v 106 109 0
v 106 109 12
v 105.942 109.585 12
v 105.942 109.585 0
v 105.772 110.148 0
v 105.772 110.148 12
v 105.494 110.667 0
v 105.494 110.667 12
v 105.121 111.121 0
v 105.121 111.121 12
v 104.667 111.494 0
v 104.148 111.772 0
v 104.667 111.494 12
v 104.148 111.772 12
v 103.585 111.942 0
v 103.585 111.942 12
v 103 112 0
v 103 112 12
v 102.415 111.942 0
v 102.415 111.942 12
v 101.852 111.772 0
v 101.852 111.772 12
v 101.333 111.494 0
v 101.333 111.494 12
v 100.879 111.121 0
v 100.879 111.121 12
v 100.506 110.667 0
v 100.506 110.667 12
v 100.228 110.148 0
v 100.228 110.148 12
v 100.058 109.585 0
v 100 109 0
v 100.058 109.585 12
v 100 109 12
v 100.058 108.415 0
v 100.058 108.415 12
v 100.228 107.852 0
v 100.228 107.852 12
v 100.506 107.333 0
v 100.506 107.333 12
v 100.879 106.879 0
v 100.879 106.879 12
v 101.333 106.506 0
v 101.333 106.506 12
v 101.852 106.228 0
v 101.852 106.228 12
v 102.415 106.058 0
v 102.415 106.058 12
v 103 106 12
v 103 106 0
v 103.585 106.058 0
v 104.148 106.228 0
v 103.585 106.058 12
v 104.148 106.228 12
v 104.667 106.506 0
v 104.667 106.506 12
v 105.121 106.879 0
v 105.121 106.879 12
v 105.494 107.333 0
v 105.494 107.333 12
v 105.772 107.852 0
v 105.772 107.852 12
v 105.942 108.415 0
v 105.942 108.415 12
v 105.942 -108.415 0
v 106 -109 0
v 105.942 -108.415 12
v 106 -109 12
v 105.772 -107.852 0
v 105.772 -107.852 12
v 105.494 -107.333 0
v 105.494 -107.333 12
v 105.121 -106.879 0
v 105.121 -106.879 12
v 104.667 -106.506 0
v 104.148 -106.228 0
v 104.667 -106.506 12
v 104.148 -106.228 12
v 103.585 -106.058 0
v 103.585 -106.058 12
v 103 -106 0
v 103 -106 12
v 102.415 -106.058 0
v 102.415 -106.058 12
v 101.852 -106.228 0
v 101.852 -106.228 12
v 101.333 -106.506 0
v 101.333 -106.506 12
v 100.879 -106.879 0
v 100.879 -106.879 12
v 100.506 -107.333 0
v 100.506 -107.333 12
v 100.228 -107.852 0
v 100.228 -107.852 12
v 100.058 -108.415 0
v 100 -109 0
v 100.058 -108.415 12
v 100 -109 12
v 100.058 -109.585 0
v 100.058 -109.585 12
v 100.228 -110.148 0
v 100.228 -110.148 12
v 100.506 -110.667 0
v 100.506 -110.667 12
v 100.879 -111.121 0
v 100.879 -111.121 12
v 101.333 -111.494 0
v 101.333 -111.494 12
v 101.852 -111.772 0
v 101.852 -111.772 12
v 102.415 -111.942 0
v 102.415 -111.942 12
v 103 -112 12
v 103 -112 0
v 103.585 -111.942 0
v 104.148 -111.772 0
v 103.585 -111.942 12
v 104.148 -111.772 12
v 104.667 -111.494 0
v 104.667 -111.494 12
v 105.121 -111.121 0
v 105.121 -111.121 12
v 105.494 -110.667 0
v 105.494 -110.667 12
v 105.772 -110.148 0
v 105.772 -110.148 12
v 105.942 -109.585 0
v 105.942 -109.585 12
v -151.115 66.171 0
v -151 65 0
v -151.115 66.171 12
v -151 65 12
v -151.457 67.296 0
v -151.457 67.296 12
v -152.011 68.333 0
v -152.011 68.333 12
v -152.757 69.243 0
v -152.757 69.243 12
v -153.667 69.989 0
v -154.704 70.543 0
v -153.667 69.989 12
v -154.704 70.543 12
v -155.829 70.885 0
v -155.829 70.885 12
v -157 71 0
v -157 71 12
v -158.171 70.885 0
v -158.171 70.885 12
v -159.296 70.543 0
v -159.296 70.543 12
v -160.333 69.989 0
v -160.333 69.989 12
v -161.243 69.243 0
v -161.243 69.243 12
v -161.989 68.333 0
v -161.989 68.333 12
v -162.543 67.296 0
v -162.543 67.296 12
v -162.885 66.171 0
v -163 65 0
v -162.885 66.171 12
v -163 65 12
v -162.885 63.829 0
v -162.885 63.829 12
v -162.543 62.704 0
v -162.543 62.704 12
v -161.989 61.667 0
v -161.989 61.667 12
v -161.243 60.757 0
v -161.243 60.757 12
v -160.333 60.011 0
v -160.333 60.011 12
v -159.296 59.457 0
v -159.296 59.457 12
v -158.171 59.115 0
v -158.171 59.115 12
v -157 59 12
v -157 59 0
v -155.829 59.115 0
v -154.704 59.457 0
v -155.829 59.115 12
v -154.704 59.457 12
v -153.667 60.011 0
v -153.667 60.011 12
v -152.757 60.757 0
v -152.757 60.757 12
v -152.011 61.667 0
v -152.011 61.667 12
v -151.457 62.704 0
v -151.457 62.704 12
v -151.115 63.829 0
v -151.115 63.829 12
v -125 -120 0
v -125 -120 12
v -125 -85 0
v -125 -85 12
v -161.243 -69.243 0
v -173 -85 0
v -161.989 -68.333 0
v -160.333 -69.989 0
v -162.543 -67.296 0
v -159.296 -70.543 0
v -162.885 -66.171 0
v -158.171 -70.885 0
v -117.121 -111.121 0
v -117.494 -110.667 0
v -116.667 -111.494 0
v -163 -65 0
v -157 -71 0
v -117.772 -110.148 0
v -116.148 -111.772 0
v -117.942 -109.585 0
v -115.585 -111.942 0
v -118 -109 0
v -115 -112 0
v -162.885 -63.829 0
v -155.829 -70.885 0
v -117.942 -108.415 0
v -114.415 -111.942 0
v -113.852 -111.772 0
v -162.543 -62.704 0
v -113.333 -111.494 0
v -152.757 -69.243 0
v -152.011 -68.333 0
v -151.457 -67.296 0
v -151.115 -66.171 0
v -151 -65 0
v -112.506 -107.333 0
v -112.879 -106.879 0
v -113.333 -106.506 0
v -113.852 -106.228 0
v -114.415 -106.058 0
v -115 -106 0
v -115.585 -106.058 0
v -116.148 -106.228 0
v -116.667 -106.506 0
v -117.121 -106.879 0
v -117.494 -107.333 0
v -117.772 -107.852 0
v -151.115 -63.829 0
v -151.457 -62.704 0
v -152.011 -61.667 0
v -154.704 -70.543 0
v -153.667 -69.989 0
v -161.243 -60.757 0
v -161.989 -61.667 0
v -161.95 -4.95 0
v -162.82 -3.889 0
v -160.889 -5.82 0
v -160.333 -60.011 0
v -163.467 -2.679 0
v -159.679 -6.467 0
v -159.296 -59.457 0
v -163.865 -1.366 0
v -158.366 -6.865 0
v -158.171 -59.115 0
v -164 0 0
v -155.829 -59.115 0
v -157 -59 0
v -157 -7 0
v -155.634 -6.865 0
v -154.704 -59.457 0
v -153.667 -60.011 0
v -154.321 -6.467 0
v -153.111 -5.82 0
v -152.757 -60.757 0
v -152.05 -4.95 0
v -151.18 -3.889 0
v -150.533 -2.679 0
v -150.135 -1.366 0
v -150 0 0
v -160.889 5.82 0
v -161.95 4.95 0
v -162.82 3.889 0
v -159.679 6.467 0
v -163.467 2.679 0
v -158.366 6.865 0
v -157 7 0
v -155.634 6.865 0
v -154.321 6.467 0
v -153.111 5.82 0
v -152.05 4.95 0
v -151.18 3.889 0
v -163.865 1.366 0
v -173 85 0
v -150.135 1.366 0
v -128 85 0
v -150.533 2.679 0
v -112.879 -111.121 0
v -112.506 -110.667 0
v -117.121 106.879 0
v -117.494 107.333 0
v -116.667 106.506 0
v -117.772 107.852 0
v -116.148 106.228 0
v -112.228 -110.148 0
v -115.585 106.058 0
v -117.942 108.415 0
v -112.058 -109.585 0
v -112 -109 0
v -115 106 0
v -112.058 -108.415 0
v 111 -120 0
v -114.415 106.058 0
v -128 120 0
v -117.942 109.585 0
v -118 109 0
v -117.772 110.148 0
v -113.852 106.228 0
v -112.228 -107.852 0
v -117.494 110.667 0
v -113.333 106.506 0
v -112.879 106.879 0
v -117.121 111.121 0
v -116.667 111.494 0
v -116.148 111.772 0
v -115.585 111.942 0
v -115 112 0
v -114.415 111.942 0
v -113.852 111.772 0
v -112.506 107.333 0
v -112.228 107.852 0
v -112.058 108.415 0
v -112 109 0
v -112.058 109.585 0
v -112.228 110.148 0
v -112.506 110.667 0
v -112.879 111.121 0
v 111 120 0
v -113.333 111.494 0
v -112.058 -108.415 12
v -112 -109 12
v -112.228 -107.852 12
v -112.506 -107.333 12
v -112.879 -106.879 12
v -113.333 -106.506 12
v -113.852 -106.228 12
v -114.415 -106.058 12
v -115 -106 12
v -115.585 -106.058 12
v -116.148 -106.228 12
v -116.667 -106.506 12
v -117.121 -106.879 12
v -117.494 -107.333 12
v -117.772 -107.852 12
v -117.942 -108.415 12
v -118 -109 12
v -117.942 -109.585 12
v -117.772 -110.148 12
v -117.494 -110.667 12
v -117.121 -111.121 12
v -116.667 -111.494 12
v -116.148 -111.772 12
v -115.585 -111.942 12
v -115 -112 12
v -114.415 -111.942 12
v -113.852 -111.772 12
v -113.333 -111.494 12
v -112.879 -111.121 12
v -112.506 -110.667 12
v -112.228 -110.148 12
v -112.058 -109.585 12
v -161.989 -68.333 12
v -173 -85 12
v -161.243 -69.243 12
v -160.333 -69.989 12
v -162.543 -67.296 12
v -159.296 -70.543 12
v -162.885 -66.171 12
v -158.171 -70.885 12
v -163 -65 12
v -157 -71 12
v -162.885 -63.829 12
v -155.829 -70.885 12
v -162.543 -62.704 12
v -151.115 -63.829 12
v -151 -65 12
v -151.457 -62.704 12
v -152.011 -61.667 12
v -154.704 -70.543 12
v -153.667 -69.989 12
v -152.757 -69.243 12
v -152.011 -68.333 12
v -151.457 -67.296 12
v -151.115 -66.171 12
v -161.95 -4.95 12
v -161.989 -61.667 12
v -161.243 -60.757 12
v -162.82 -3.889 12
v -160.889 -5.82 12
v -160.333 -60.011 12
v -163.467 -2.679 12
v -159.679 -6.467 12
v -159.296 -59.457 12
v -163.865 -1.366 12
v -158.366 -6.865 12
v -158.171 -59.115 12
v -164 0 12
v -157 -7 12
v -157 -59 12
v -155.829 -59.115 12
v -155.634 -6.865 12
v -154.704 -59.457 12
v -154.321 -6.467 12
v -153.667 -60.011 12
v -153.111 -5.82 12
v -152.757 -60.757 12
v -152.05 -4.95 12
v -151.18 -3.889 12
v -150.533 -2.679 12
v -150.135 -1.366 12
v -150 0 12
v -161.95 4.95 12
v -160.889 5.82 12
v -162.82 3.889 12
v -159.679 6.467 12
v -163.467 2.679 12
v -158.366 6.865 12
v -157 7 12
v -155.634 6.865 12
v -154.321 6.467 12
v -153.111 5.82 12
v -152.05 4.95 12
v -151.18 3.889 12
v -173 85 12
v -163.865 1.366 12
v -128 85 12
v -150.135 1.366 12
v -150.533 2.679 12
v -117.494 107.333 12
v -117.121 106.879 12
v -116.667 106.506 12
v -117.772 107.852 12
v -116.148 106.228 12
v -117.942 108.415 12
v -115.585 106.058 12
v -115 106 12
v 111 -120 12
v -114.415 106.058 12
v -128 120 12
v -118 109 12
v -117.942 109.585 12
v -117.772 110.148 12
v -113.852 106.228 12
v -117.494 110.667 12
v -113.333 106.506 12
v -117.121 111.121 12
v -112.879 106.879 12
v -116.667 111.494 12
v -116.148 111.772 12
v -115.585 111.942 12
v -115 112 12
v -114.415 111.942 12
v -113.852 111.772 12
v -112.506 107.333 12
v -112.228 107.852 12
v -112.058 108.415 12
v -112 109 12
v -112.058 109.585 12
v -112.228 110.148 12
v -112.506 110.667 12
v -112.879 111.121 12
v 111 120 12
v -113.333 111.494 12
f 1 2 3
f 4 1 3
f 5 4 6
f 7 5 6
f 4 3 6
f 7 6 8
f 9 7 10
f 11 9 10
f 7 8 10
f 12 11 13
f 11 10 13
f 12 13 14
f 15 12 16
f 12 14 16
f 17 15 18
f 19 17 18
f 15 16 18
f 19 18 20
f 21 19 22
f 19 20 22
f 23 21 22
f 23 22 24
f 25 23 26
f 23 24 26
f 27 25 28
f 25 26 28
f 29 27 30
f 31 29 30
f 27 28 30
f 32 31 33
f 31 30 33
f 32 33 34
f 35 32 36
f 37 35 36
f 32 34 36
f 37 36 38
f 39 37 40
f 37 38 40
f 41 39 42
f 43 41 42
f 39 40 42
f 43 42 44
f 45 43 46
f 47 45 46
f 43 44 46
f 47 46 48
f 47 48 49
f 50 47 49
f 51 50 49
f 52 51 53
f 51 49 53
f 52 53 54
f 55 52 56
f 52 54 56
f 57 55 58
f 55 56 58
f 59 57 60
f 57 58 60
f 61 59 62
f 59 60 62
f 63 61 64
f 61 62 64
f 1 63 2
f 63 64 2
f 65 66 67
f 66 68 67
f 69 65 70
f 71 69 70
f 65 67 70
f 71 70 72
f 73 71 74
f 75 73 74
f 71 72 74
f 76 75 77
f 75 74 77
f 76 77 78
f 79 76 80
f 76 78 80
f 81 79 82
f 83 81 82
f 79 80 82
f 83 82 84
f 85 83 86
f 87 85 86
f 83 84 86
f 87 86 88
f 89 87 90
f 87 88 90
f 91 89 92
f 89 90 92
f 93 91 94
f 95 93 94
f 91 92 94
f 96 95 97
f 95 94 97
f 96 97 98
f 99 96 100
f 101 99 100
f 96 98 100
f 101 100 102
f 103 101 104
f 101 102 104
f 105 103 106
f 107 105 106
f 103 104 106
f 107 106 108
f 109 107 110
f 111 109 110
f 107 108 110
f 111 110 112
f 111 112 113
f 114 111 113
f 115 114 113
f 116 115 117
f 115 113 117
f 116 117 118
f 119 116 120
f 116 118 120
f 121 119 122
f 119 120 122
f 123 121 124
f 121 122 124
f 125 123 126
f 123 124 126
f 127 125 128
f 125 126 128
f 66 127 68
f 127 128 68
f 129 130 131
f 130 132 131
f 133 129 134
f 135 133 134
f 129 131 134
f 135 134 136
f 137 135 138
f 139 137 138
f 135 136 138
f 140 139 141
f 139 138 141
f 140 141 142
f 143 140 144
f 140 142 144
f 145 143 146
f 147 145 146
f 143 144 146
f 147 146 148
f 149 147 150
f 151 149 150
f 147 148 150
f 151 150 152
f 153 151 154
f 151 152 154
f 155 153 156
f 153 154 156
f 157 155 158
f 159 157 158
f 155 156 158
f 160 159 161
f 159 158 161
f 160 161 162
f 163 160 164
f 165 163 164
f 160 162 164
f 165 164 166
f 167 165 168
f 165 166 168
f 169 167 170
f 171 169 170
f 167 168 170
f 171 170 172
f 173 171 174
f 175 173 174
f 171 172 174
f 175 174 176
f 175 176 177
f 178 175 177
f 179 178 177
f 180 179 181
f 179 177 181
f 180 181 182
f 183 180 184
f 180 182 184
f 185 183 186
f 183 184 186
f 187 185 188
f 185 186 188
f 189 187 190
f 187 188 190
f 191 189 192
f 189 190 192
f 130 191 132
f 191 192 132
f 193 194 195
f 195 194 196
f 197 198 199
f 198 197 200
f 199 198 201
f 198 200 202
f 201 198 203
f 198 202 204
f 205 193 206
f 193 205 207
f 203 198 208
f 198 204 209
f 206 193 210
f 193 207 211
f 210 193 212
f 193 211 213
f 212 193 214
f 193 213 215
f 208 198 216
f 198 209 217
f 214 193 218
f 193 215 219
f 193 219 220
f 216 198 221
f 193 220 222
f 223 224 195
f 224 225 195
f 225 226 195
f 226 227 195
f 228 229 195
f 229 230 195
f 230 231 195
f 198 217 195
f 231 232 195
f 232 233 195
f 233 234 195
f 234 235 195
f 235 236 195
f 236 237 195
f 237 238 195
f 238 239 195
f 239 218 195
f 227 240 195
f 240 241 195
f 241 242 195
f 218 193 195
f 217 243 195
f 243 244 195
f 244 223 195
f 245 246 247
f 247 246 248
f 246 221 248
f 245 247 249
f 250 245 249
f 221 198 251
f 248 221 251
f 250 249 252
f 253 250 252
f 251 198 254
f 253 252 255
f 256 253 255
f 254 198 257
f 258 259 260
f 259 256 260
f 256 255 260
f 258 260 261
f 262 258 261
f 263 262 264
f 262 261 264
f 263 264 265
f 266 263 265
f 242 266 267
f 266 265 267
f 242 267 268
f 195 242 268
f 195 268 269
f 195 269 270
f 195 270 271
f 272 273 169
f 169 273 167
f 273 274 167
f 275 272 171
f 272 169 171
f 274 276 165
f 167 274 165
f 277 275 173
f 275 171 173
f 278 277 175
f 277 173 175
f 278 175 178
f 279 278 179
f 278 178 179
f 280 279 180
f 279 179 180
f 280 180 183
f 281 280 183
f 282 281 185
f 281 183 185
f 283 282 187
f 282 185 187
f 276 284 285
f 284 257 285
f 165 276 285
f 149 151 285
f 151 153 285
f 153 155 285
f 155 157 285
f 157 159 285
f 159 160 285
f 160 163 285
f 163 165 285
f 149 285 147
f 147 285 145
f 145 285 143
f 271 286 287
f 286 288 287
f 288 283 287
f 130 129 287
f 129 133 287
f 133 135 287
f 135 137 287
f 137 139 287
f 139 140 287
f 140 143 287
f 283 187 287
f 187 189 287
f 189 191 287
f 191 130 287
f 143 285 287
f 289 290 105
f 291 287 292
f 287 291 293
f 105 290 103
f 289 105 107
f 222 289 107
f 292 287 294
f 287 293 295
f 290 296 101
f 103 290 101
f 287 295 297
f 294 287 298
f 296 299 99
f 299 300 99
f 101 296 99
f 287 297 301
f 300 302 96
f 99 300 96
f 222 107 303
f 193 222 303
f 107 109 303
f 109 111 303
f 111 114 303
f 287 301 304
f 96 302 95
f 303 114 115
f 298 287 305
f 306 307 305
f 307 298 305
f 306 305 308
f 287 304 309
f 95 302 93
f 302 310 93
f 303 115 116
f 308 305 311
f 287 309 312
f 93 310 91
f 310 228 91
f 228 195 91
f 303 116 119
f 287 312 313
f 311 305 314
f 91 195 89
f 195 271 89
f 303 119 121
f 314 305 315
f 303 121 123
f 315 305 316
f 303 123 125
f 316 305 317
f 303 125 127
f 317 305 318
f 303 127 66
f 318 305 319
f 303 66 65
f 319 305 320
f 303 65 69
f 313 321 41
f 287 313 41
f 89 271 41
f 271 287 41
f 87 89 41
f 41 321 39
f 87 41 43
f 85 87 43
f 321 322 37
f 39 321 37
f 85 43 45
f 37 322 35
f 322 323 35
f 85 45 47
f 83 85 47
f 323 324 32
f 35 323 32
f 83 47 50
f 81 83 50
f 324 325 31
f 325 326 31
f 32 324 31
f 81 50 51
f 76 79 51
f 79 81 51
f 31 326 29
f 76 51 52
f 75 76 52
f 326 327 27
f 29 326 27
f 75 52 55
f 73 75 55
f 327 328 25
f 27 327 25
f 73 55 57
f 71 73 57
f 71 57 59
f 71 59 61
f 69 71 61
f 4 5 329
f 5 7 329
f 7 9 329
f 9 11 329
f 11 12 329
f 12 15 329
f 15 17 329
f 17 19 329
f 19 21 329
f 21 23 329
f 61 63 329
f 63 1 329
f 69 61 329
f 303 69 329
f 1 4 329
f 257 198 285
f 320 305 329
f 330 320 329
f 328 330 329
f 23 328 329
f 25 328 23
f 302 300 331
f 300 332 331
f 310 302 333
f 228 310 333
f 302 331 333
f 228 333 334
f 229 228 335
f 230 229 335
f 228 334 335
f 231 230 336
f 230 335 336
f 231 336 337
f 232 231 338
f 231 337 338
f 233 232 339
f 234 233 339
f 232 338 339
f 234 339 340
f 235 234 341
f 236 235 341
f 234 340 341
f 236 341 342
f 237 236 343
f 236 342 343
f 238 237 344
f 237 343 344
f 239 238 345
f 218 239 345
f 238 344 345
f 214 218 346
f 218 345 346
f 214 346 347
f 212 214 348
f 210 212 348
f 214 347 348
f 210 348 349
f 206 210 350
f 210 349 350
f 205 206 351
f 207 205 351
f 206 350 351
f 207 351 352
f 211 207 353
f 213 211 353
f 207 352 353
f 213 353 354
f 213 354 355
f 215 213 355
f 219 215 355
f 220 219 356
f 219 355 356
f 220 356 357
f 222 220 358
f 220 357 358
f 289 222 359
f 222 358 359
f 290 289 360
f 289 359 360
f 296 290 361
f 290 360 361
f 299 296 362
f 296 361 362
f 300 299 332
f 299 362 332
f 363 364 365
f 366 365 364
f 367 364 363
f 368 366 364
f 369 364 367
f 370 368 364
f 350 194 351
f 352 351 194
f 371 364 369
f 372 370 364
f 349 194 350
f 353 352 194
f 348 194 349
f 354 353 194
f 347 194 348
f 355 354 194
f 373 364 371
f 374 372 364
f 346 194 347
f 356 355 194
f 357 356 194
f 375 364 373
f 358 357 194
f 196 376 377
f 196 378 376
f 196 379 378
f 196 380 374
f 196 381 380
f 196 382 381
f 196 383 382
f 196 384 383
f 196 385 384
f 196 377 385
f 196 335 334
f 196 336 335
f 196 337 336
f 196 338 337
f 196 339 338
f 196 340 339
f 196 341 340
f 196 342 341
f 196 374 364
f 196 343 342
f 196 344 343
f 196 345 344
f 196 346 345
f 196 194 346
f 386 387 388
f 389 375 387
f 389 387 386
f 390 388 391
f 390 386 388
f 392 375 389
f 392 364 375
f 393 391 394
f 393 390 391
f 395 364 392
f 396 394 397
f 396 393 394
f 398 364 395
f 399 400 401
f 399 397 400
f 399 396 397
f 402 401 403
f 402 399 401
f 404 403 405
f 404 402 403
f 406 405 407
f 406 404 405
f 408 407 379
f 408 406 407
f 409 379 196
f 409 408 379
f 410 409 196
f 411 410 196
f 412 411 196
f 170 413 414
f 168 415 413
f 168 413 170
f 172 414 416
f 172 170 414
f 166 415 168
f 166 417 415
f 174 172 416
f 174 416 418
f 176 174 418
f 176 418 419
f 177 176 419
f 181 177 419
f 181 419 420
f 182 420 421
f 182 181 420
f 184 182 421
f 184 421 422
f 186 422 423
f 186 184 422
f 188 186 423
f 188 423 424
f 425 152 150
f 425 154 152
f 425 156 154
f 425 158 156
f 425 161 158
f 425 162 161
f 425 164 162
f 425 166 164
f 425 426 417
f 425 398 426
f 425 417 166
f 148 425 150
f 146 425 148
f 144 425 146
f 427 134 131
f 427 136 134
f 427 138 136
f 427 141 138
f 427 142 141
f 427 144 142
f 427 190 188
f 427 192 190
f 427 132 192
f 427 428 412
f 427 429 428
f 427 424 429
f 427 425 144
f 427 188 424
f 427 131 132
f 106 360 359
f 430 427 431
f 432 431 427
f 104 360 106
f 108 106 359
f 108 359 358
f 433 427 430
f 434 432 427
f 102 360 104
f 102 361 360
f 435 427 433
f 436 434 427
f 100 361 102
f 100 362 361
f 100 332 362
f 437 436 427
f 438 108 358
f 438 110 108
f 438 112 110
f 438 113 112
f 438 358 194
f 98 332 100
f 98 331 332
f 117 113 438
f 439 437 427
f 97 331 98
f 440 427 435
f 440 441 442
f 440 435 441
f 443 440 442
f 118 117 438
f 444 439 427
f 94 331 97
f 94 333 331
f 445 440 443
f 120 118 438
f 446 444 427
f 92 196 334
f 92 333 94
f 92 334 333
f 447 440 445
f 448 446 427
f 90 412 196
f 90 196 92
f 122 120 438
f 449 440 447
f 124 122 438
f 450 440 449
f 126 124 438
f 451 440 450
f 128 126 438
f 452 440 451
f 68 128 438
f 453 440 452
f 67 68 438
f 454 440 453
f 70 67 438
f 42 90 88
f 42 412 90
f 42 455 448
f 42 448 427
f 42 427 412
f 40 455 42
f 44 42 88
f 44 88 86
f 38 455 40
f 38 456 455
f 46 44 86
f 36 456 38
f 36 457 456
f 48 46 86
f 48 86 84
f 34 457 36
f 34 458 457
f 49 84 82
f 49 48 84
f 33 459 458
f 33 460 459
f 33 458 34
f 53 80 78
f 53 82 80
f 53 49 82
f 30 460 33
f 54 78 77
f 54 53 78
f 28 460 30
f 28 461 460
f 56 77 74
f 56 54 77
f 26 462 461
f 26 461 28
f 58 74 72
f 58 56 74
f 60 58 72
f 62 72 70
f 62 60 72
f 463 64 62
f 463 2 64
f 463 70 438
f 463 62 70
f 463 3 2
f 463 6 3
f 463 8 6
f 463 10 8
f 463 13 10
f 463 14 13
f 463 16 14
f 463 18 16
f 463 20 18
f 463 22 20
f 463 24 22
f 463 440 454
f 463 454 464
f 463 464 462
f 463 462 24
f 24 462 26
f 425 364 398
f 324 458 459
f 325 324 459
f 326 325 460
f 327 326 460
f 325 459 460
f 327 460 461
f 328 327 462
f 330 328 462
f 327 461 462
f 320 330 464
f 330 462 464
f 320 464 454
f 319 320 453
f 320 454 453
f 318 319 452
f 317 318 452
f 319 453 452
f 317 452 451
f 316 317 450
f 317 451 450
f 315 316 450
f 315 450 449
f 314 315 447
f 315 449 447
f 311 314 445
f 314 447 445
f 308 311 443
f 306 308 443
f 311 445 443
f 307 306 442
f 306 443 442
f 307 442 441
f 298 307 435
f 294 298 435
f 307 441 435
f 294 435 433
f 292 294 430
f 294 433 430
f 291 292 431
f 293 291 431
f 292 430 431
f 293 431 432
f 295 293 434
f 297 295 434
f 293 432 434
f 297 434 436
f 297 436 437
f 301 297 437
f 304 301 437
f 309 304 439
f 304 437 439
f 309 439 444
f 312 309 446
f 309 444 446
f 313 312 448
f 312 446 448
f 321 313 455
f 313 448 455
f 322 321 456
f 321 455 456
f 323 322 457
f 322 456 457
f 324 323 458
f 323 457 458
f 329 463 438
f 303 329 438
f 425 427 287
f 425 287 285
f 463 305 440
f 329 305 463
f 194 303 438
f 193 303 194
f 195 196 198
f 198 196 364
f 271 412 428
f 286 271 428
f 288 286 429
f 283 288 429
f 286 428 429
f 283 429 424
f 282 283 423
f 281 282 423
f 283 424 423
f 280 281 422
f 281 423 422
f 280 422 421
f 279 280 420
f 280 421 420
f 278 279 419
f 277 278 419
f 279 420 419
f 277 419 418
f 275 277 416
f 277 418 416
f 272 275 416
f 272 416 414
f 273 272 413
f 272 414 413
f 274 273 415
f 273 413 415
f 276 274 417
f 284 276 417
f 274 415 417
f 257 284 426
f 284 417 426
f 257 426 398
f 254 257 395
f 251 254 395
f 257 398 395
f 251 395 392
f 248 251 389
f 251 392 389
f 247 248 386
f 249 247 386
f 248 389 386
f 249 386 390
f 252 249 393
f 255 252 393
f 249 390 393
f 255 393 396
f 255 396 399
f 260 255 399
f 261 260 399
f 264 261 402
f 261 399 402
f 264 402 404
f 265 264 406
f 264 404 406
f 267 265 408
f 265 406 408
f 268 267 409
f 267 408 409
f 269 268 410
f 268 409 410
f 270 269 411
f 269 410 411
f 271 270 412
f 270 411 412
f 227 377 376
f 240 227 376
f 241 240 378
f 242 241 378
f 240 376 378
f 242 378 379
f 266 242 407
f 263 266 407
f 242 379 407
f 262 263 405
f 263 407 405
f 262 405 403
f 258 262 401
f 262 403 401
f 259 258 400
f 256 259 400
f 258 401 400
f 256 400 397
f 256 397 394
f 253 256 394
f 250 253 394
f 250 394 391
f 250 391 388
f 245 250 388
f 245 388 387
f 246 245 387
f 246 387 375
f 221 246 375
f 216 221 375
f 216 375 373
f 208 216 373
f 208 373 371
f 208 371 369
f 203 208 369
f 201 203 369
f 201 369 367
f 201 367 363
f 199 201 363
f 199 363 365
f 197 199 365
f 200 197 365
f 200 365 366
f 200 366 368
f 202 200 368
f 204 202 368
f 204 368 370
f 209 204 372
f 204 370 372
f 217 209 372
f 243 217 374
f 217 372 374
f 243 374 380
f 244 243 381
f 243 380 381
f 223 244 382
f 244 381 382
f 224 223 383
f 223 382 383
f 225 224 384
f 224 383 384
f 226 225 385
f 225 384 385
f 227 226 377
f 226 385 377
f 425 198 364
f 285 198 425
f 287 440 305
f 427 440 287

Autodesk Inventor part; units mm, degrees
ref_plane "YZ Plane" through (0, 0, 0) normal (1, 0, 0) x (0, 1, 0)
ref_plane "XZ Plane" through (0, 0, 0) normal (0, 1, 0) x (-1, 0, 0)
ref_plane "XY Plane" through (0, 0, 0) normal (0, 0, 1) x (1, 0, 0)
sketch "Sketch1" plane through (0, 0, 0) normal (0, 0, 1) x (1, 0, 0)
  line L0 (-173, 120) -> (173, 120)
  line L1 (173, 120) -> (173, -120)
  line L2 (173, -120) -> (-173, -120)
  line L3 (-173, -120) -> (-173, 120)
  point P0 (0, 0)
  dimension "d0" = 173
  dimension "d1" = 240
  dimension "d2" = 346
  dimension "d3" = 120
extrude "Plade tykkelse" add sketch "Sketch1" along normal blind 12
sketch "Sketch2" plane through (0, 0, 12) normal (0, 0, 1) x (1, 0, 0)
  line L0 (5, 88) -> (-145, 88) projected
  line L1 (5, 88) -> (5, 100) projected
  line L2 (-145, 100) -> (5, 100) projected
  line L3 (-145, 88) -> (-145, 100) projected
  line L4 (5, -100) -> (-145, -100) projected
  line L5 (5, -100) -> (5, -88) projected
  line L6 (-145, -88) -> (5, -88) projected
  line L7 (-145, -100) -> (-145, -88) projected
  circle A0 centre (-115, 109) radius 3
  circle A1 centre (103, 109) radius 3
  circle A2 centre (-115, -109) radius 3
  circle A3 centre (103, -109) radius 3
  circle A4 centre (-157, 65) radius 6
  circle A5 centre (-157, 0) radius 7
  circle A6 centre (-157, -65) radius 6
  point P0 (0, 0)
  dimension "d22" = 6
  dimension "d23" = 6
  dimension "d24" = 6
  dimension "d25" = 6
  dimension "d26" = 218
  dimension "d27" = 218
  dimension "d28" = 218
  dimension "d29" = 218
  dimension "d36" = 12
  dimension "d37" = 14
  dimension "d38" = 12
  dimension "d39" = 130
  dimension "d40" = 65
  dimension "d41" = 157
  dimension "d42" = 157
  dimension "d43" = 157
  dimension "d44" = 0
  dimension "d45" = 109
  dimension "d46" = 109
  dimension "d64" = 115
  dimension "d65" = 115
extrude "Monteringshuller & -udskæringer" cut sketch "Sketch2" against normal blind 14 contours A0 | A1 | A2 | A3 | A4 | A5 | A6
sketch "Sketch3" plane through (0, 0, 12) normal (0, 0, 1) x (1, 0, 0)
  circle A0 centre (103, -109) radius 3 projected
  line L0 (-173, -120) -> (173, -120) projected
  line L1 (173, -120) -> (173, 120) projected
  line L2 (173, 120) -> (111, 120)
  line L3 (111, 120) -> (111, -120)
  line L4 (111, -120) -> (173, -120)
  line L5 (173, -120) -> (173, 120)
  point P0 (0, 0)
  dimension "d47" = 8
extrude "Sidste længde tilpasning" cut sketch "Sketch3" against normal blind 16 contours L3 L2 L1 L0
sketch "Sketch5" plane through (0, 0, 12) normal (0, 0, 1) x (1, 0, 0)
  line L0 (111, 120) -> (-173, 120) construction
  line L1 (-173, 120) -> (-173, -120) construction
  line L2 (-173, -120) -> (111, -120) construction
  circle A0 centre (-157, 0) radius 7 construction
  circle A1 centre (-157, 65) radius 6 construction
  circle A2 centre (-115, -109) radius 3 construction
  circle A3 centre (-115, 109) radius 3 construction
  circle A4 centre (103, 109) radius 3 construction
  circle A5 centre (103, -109) radius 3 construction
  circle A6 centre (-157, -65) radius 6 construction
  line L3 (-173, -120) -> (-173, 120) projected
  line L4 (-173, -120) -> (-125, -120)
  line L5 (-125, -120) -> (-125, -85)
  line L6 (-125, -85) -> (-173, -85)
  line L7 (-173, -85) -> (-173, -120)
  line L8 (-173, 120) -> (-128, 120)
  line L9 (-128, 120) -> (-128, 85)
  line L10 (-128, 85) -> (-173, 85)
  line L11 (-173, 85) -> (-173, 120)
  line L12 (111, -120) -> (111, 120) projected
  point P0 (0, 0)
  dimension "d58" = 48
  dimension "d59" = 35
  dimension "d60" = 45
  dimension "d61" = 35
extrude "CutOff" cut sketch "Sketch5" against normal up to surface (12 mm away)
equation "\"d0\" = 0.5 * d2"
equation "\"d3\" = 0.5 * d1"
equation "\"d23\" = d22"
equation "\"d24\" = d22"
equation "\"d25\" = d22"
equation "\"d26\" = d29"
equation "\"d27\" = d28"
equation "\"d40\" = 0.5 * d39"
equation "\"d42\" = d41"
equation "\"d43\" = d41"
equation "\"d45\" = 0.5 * d28"
equation "\"d46\" = 0.5 * d27"
equation "\"d65\" = d64"
properties part number "Byggeplade Holder" material "Wood (Cherry)"
